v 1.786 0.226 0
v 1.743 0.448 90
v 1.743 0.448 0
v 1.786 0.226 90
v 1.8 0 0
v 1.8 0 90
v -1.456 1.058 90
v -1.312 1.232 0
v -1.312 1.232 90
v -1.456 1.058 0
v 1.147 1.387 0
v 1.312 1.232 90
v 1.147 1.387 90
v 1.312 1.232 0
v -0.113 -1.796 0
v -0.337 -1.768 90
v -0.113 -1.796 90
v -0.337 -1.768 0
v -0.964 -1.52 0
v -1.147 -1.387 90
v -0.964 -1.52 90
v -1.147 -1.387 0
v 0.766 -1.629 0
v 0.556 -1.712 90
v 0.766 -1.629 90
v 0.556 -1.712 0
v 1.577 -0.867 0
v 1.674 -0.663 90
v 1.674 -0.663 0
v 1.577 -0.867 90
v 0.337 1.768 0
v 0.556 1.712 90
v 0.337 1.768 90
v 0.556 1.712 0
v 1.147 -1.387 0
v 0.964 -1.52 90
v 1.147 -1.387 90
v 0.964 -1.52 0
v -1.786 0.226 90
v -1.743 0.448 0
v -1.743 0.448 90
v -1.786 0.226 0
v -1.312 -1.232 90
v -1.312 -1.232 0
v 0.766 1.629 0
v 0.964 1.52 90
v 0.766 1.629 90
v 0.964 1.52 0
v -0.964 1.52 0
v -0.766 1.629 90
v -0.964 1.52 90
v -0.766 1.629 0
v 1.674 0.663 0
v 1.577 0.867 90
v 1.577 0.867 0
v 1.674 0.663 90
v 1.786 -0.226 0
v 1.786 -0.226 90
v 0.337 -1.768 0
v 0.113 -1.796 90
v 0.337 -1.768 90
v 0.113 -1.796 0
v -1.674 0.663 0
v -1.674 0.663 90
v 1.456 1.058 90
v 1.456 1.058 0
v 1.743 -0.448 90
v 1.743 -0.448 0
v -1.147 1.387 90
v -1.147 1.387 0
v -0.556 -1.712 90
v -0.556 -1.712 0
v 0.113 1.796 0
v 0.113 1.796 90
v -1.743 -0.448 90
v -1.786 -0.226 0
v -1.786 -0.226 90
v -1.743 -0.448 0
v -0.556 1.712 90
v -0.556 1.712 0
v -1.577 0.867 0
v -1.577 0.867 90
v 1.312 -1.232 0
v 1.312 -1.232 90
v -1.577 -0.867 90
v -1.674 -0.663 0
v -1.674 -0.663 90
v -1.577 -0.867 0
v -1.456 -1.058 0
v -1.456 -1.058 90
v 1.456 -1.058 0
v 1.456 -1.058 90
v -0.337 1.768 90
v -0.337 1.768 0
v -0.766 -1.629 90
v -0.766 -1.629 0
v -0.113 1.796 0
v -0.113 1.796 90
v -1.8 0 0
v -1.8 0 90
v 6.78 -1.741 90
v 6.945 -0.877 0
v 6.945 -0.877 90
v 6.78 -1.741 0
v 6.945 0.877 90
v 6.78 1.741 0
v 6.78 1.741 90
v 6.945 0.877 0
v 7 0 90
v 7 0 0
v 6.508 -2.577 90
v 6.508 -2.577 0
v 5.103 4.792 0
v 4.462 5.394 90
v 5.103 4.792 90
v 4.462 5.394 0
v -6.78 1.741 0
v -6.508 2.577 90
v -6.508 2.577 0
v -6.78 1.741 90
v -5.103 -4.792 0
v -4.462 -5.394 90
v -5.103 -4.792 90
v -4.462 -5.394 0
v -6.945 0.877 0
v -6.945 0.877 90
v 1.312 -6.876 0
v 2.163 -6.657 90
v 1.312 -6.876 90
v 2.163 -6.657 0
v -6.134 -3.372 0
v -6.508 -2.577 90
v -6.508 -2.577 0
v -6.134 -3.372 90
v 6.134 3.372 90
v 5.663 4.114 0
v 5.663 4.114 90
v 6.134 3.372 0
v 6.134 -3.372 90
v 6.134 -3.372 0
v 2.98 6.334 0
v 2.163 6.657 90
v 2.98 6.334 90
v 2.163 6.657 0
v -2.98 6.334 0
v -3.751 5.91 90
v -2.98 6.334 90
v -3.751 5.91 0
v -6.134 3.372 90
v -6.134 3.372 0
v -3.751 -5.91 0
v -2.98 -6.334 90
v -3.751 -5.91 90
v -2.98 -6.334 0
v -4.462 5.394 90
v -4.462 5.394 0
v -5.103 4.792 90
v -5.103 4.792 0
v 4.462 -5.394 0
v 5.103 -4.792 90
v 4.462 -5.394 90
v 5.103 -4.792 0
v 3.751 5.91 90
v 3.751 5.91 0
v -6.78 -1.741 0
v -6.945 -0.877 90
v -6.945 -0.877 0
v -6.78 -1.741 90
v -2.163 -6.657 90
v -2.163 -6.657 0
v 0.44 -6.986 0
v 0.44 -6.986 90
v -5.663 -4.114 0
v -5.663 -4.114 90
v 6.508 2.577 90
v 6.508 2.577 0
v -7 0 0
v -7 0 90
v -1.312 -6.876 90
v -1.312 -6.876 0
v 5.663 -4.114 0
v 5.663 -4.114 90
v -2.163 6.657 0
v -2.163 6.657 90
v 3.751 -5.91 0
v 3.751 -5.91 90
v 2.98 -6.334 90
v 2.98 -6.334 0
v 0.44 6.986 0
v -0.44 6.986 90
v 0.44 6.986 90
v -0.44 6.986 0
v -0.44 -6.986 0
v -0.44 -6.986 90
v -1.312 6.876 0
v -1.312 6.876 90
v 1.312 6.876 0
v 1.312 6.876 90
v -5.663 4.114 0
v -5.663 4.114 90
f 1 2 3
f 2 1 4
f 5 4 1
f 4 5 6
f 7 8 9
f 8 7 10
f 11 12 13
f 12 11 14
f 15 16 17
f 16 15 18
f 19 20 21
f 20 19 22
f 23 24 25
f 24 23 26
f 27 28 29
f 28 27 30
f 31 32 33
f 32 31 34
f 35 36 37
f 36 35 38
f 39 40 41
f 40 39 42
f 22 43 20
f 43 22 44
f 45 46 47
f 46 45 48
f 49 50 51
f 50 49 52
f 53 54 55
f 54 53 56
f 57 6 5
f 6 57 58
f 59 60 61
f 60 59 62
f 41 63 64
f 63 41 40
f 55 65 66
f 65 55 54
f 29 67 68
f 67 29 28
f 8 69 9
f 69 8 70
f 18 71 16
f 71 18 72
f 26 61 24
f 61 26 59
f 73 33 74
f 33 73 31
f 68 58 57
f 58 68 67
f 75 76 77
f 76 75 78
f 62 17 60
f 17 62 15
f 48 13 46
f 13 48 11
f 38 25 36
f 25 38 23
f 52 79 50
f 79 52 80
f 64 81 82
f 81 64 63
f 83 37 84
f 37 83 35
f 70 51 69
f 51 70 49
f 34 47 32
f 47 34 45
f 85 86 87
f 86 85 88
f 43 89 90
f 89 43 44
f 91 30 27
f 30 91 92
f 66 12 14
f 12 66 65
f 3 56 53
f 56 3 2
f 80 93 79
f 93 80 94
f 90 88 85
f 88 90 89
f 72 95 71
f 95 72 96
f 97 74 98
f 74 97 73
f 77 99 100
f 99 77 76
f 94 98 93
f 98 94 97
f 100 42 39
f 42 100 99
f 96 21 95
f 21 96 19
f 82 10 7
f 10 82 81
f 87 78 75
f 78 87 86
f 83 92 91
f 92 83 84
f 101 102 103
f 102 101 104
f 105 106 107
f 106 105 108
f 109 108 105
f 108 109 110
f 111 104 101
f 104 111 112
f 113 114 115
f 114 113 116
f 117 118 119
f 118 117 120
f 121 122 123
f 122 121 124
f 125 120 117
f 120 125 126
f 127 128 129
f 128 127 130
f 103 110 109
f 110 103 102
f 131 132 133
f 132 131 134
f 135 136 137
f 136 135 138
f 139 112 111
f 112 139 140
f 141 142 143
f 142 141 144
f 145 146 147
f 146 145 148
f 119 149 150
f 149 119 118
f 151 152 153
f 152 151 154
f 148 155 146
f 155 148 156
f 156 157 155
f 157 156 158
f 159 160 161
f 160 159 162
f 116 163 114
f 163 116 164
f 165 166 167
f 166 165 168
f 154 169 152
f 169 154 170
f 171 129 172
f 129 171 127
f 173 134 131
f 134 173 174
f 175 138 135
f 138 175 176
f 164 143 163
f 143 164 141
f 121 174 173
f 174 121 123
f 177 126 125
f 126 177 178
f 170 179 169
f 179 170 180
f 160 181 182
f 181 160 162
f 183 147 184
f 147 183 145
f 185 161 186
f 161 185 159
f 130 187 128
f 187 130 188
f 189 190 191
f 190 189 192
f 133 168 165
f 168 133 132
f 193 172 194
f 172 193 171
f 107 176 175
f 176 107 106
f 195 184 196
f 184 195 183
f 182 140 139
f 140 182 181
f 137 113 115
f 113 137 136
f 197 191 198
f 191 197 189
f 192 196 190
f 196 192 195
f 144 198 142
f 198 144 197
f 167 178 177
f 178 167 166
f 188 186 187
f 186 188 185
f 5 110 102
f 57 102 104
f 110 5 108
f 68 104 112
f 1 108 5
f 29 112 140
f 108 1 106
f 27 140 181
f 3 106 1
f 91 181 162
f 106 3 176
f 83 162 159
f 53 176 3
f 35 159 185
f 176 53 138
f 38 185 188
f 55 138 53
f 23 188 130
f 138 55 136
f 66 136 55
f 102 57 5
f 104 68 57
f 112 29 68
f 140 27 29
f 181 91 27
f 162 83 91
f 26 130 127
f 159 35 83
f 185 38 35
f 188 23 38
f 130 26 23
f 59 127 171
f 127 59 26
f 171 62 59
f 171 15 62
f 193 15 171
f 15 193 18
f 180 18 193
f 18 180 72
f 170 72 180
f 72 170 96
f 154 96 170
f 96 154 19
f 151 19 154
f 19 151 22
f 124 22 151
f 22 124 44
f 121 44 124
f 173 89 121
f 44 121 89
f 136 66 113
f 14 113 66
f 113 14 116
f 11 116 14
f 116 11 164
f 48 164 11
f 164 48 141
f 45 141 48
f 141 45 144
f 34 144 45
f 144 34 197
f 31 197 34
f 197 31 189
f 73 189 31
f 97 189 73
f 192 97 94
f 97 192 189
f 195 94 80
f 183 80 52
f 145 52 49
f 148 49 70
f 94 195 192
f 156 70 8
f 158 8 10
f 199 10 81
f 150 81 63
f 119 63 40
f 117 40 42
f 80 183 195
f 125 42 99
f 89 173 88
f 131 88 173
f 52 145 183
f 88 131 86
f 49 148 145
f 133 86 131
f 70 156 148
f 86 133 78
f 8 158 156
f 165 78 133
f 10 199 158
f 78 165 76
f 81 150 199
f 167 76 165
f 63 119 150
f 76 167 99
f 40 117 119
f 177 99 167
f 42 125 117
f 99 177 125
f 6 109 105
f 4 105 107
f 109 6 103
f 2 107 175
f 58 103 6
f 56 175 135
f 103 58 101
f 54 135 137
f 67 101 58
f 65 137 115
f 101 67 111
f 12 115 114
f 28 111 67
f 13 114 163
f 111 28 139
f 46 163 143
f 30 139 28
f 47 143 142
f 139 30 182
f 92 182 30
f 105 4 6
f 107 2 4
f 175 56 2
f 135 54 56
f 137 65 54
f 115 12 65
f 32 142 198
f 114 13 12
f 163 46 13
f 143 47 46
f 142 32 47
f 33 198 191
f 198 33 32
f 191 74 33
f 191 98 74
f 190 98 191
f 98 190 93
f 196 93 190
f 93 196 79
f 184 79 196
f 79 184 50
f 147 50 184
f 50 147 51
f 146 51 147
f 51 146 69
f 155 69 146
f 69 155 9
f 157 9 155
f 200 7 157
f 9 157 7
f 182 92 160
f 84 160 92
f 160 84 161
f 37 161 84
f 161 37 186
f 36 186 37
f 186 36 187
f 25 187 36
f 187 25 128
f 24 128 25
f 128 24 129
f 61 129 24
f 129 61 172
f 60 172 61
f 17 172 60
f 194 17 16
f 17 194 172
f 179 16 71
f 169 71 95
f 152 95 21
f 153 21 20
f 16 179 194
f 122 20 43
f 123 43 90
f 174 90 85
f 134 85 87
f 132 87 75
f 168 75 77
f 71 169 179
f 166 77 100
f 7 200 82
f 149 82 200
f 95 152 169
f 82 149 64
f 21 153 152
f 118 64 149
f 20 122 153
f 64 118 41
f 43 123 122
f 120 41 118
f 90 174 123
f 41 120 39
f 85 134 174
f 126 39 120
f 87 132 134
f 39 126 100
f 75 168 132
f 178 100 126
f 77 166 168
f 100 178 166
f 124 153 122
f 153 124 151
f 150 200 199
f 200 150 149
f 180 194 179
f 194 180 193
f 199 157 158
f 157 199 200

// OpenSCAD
$fn = 50;


difference() {
	union() {
		cylinder(h = 90, r = 7.0000000000);
	}
	union() {
		translate(v = [0.0000000000, 0.0000000000, -100.0000000000]) {
			cylinder(h = 200, r = 1.8000000000);
		}
		cylinder(h = 90, r = 1.8000000000);
		cylinder(h = 90, r = 1.8000000000);
		cylinder(h = 90, r = 1.8000000000);
	}
}
